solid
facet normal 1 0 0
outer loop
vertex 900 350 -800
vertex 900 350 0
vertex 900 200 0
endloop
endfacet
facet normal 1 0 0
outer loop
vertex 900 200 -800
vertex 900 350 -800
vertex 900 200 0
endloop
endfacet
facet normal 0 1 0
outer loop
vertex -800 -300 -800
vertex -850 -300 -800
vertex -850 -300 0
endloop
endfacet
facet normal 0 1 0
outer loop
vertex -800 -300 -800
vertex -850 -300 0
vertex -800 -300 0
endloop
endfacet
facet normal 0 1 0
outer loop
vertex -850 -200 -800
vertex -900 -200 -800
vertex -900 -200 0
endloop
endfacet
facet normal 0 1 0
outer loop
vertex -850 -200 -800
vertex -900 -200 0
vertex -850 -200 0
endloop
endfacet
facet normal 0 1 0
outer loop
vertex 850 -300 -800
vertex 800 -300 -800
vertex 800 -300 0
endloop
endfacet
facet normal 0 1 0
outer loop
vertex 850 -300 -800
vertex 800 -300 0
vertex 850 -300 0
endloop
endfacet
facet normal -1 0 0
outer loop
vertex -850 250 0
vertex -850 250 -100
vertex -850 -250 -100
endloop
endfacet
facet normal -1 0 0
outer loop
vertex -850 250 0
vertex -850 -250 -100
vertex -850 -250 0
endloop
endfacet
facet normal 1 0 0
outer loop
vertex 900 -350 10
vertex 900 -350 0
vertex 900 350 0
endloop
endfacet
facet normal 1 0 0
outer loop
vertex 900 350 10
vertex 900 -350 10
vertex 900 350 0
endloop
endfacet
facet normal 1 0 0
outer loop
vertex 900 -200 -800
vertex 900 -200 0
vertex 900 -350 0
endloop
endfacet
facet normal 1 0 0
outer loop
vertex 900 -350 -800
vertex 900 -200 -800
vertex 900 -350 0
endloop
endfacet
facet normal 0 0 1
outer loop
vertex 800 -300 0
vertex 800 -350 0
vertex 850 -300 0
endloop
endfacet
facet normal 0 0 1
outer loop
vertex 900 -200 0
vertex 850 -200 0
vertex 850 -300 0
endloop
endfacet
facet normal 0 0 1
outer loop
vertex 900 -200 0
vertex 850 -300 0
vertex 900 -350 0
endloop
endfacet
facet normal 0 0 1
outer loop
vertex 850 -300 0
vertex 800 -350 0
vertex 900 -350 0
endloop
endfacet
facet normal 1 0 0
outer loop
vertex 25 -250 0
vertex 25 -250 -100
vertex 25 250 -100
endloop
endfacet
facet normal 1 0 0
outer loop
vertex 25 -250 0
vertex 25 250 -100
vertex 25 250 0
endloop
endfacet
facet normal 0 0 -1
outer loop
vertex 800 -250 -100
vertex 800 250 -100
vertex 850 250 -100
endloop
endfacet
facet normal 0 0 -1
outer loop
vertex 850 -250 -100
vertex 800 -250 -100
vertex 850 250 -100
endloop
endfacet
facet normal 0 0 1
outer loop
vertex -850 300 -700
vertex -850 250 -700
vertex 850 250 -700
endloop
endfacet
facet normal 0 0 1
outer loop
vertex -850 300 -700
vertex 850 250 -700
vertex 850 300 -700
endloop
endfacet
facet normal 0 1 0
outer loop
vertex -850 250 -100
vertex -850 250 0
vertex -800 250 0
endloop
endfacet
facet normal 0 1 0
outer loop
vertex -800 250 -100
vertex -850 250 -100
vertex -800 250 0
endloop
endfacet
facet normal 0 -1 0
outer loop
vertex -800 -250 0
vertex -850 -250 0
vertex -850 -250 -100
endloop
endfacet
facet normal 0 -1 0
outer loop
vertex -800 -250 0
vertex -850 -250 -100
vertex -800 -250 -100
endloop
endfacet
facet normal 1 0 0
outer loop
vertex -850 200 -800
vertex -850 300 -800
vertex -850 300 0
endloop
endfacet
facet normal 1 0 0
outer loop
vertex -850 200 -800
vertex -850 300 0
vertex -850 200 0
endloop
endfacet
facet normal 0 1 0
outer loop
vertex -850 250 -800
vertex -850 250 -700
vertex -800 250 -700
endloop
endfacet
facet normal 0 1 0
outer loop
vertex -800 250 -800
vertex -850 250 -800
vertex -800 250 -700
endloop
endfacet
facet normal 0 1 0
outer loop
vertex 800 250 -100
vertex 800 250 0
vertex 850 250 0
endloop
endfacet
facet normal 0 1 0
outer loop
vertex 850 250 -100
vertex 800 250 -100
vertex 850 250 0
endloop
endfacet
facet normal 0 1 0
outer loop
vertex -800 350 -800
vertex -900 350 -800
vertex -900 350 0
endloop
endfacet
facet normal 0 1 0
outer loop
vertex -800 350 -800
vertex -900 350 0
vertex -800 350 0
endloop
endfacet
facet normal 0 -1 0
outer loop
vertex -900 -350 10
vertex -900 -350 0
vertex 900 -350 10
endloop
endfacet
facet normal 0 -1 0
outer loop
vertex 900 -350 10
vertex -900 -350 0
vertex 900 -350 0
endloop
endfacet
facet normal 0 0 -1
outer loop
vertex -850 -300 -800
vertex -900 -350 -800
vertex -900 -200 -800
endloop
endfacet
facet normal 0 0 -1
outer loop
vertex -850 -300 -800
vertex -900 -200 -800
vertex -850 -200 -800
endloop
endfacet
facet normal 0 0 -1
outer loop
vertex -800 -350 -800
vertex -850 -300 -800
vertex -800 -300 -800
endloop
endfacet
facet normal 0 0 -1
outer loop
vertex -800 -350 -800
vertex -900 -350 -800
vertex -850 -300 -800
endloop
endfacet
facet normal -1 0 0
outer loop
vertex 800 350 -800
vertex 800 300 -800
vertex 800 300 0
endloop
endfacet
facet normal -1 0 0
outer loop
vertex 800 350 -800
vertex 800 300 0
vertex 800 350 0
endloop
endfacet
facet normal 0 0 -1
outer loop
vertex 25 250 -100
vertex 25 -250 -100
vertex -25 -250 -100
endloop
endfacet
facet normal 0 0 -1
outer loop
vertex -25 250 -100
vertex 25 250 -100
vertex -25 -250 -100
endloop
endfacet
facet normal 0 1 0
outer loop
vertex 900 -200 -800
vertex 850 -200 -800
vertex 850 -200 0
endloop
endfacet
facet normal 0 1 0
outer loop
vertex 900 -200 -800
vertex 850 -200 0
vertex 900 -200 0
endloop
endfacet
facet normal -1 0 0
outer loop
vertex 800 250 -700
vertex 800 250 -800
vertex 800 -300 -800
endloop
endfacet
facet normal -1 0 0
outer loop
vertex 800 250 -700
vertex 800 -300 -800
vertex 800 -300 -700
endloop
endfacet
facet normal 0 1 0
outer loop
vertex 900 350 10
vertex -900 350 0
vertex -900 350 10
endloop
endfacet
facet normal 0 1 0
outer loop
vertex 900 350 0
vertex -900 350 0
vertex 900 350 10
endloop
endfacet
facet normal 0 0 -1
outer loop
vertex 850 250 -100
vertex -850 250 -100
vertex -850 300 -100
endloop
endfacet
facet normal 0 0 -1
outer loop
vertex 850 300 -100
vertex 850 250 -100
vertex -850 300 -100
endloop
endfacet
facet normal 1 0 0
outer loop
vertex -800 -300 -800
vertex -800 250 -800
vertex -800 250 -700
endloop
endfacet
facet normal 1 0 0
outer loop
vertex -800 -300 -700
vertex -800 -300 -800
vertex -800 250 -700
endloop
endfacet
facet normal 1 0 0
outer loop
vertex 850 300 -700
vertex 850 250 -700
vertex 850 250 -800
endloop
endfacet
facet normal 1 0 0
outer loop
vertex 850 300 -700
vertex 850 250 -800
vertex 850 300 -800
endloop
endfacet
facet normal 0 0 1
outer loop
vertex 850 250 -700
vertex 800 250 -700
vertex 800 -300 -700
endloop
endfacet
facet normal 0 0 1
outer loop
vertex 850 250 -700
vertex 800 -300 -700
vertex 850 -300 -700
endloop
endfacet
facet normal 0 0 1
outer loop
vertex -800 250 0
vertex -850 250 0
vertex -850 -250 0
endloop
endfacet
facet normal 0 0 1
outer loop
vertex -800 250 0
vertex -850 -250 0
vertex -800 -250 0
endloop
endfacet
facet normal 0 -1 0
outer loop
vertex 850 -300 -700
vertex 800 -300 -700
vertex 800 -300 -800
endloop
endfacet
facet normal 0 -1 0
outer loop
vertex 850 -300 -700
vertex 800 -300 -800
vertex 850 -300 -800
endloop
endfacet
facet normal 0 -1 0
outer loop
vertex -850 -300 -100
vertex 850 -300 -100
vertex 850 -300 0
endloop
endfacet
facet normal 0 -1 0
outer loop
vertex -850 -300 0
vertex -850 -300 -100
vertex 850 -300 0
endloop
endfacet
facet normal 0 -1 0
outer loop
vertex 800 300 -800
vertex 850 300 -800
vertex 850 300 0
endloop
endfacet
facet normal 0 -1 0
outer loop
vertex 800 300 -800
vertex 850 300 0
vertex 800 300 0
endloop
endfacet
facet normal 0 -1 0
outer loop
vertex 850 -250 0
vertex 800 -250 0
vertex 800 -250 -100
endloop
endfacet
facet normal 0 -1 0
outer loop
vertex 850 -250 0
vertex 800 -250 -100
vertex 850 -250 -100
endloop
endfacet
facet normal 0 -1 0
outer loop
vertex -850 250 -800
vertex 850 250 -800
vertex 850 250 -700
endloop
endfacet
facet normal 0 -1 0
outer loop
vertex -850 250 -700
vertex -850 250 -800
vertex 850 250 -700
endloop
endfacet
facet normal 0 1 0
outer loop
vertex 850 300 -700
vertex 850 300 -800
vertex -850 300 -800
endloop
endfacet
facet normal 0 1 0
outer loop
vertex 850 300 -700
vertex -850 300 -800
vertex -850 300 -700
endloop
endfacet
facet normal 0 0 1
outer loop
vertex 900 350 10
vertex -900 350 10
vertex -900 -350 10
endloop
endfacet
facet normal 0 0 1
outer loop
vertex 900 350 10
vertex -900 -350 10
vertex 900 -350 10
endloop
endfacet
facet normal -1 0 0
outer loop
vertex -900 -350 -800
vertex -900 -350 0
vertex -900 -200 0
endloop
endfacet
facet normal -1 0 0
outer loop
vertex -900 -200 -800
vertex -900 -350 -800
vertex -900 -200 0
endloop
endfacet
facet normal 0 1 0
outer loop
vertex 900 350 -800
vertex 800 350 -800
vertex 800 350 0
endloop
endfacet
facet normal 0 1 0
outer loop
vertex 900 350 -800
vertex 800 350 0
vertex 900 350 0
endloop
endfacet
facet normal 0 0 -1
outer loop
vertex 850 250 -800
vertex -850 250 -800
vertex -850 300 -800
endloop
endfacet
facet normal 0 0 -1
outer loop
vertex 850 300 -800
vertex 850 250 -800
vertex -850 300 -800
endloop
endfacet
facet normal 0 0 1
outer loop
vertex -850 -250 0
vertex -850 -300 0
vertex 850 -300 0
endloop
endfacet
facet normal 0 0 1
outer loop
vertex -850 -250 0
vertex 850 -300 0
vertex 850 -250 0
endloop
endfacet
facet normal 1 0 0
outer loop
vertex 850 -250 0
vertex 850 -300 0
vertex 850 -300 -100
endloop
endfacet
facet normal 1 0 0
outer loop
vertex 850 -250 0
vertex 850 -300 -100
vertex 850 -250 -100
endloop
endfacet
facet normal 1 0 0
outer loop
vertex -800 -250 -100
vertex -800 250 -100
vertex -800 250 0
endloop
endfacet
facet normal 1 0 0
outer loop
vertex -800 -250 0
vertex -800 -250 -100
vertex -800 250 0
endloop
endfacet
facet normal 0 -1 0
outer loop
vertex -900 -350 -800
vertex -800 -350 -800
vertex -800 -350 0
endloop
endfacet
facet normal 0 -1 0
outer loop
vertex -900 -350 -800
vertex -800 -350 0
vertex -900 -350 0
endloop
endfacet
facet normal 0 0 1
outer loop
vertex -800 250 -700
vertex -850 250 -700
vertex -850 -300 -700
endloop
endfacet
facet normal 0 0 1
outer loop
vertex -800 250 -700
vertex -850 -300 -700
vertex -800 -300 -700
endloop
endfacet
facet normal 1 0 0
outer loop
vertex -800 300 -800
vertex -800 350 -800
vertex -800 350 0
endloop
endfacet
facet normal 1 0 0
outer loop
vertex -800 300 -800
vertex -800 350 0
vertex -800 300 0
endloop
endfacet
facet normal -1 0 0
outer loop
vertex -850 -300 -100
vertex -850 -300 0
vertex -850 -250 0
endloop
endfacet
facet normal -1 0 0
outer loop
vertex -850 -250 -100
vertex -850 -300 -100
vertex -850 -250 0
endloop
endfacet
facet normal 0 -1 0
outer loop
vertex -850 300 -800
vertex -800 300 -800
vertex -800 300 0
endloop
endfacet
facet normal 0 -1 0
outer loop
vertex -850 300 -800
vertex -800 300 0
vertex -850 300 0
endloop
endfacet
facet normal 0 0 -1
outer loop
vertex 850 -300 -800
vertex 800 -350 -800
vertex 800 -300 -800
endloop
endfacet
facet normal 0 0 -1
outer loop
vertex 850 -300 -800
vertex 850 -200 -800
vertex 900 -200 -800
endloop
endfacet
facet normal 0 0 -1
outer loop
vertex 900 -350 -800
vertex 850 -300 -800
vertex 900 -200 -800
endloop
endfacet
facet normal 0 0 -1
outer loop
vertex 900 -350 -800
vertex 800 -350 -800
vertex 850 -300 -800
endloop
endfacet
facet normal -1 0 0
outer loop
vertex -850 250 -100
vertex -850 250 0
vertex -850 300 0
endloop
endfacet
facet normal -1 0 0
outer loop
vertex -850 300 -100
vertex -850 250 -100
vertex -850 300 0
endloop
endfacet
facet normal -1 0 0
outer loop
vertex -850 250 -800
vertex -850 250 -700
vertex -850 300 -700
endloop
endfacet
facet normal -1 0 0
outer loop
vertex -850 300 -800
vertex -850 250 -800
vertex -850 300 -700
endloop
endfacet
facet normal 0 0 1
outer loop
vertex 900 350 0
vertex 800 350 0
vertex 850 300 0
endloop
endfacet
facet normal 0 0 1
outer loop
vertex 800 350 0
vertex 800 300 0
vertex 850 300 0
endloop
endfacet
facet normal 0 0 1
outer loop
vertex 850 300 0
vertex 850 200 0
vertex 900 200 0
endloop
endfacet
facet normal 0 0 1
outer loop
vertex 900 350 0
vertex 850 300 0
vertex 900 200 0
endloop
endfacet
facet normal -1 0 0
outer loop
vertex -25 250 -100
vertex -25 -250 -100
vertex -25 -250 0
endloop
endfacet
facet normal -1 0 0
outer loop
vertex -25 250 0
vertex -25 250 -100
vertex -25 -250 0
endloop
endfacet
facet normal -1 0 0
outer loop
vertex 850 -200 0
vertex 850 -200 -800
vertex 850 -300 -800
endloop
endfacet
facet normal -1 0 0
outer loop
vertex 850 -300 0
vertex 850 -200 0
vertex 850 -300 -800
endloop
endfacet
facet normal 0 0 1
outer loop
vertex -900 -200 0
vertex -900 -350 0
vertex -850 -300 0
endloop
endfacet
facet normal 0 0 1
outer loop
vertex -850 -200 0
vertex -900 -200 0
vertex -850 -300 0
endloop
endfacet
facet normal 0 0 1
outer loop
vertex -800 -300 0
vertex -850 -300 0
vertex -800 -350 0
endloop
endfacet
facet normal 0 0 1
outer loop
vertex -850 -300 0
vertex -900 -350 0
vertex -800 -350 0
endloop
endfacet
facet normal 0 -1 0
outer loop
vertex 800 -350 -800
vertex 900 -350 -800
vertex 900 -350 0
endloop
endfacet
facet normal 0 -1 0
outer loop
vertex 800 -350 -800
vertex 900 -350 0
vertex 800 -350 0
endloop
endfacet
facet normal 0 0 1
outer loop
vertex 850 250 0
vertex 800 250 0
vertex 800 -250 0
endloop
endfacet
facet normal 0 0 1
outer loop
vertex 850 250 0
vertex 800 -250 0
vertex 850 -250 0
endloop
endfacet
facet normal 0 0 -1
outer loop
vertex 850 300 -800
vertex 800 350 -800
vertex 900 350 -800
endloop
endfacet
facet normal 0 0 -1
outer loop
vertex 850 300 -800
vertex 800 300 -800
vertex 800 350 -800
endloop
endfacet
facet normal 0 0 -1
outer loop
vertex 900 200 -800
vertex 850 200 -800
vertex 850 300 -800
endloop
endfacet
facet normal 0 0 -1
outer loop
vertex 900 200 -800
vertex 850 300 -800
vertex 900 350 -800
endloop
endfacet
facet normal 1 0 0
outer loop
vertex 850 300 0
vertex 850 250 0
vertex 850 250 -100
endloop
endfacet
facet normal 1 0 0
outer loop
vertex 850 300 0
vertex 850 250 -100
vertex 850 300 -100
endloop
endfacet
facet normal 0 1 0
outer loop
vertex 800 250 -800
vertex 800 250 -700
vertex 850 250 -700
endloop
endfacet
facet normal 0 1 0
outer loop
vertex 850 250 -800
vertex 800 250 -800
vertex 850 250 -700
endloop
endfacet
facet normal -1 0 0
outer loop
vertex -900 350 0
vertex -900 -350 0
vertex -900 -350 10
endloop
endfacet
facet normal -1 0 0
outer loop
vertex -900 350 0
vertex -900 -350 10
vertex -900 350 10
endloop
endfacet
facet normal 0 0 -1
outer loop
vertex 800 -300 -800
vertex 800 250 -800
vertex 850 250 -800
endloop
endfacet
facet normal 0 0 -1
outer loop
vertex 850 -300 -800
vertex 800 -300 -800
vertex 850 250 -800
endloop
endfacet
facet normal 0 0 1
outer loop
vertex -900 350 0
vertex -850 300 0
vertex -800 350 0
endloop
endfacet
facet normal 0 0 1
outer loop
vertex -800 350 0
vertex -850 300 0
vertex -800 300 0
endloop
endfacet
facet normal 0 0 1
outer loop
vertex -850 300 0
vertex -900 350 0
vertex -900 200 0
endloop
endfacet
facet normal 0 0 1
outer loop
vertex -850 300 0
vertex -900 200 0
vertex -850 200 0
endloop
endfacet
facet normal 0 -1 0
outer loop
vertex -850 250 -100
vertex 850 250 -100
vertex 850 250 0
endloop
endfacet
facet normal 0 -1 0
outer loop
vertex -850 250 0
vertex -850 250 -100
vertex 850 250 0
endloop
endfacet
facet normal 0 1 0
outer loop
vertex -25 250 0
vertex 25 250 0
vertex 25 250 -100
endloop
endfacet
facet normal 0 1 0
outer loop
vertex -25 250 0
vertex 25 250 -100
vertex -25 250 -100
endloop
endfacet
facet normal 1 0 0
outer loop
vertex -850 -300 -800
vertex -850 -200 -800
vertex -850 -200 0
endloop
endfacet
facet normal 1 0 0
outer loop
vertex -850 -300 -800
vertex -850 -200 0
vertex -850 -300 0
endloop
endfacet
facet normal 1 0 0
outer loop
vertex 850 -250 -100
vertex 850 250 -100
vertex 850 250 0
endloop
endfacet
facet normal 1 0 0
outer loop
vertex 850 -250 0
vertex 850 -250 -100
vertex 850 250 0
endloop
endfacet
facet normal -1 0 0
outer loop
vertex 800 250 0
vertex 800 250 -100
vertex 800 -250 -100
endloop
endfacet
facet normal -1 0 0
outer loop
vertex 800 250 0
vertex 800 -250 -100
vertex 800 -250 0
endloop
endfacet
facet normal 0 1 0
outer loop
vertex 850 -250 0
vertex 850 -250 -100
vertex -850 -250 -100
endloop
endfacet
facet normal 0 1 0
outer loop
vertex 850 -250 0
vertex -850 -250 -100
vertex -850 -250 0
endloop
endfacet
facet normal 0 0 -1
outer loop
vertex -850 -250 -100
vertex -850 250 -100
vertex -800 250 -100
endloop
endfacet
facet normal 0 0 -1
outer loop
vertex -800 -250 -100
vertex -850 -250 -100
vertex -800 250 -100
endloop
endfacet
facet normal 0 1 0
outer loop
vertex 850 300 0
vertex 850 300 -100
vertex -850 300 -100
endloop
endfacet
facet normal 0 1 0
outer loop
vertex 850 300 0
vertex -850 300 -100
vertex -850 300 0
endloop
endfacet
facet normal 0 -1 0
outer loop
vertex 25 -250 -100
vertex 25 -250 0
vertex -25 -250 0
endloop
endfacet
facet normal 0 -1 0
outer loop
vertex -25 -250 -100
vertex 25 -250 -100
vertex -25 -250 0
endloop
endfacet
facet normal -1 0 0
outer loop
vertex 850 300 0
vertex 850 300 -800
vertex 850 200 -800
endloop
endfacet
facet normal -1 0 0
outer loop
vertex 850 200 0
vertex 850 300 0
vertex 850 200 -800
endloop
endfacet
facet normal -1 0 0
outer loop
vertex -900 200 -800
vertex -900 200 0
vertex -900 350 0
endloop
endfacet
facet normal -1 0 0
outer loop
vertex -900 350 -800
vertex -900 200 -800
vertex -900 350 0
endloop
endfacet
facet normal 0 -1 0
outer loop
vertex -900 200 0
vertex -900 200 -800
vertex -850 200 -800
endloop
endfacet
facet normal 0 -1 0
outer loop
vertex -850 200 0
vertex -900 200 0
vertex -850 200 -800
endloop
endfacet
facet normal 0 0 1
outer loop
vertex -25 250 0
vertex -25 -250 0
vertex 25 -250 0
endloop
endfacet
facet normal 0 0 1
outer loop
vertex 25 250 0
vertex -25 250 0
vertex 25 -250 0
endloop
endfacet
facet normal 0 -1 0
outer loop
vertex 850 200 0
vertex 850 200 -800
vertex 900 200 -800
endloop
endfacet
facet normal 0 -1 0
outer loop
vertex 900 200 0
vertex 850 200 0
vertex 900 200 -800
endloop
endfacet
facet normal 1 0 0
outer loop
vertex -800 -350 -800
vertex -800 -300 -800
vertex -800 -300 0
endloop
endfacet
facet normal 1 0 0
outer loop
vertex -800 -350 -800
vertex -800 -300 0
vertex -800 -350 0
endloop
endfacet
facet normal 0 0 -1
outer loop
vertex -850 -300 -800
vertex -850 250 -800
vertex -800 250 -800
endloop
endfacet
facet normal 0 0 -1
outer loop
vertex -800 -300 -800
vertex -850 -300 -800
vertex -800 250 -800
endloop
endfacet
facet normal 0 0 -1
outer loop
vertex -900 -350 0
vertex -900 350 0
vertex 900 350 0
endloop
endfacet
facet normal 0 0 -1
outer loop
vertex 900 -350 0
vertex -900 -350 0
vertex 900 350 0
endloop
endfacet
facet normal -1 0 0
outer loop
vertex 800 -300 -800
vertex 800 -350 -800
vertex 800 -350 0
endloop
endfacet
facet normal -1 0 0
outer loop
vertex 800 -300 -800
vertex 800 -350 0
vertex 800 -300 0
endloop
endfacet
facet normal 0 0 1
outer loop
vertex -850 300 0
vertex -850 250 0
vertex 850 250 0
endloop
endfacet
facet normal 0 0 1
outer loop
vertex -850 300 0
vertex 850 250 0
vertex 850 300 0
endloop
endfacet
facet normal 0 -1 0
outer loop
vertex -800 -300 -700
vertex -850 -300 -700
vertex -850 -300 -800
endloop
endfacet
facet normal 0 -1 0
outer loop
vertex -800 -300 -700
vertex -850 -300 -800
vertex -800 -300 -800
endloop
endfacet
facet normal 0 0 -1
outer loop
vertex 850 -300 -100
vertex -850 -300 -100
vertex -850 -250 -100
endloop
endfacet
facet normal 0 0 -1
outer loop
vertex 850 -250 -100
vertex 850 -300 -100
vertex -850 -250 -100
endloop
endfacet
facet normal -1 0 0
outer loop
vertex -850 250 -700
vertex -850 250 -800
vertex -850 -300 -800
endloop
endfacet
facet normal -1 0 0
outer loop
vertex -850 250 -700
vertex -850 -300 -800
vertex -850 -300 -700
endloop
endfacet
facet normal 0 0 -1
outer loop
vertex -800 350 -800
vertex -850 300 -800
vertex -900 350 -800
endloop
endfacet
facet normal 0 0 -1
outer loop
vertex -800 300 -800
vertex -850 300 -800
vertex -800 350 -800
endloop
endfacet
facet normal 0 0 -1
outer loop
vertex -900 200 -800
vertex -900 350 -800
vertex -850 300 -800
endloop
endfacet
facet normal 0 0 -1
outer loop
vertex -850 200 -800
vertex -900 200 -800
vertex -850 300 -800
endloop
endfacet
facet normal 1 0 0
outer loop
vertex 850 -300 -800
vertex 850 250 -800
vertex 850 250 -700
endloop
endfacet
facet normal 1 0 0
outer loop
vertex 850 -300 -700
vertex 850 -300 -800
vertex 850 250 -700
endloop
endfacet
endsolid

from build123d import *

# Parameters (mm, degrees)
F0_W      = 1800
F0_H      = 700
F1_DEPTH  = 10
F2_W      = 50
F2_H      = 100
F3_DEPTH  = 800
F4_W      = 50
F4_H      = 100
F5_DEPTH  = 1700
F6_W      = 50
F6_H      = 100
F7_DEPTH  = 1700
F8_W      = 50
F8_H      = 100
F9_DEPTH  = 500
F10_W     = 50
F10_H     = 100
F11_DEPTH = 500
F12_W     = 50
F12_H     = 100
F13_DEPTH = 1700
F14_W     = 50
F14_H     = 100
F15_DEPTH = 550
F16_W     = 50
F16_H     = 100
F17_DEPTH = 550
F18_W     = 25
F18_H     = 100
F19_DEPTH = 500


with BuildPart() as f1:
    # F0 (on Top) → F1 (new body)
    with BuildSketch(Plane.XY):
        Rectangle(F0_W, F0_H)
    extrude(amount=F1_DEPTH)


with BuildPart() as f3:
    # F2 (on face) → F3 (new body)
    with BuildSketch(Plane(origin=(0, 0, 0), x_dir=(1, 0, 0), z_dir=(0, 0, -1))):
        Polygon((-800, 350), (-900, 350), (-900, 300), (-850, 300), (-800, 300), align=None)
        with Locations((-875, 250)):
            Rectangle(F2_W, F2_H)
        with Locations((-875, -250)):
            Rectangle(F2_W, F2_H)
        Polygon((-850, -300), (-900, -300), (-900, -350), (-800, -350), (-800, -300), align=None)
        Polygon((800, -350), (900, -350), (900, -300), (850, -300), (800, -300), align=None)
        with Locations((875, -250)):
            Rectangle(F2_W, F2_H)
        Polygon((900, 300), (900, 350), (800, 350), (800, 300), (850, 300), align=None)
        with Locations((875, 250)):
            Rectangle(F2_W, F2_H)
    extrude(amount=F3_DEPTH)


with BuildPart() as f5:
    # F4 (on face) → F5 (new body, through all)
    with BuildSketch(Plane.YZ.offset(-850)):
        with Locations((-275, -50)):
            Rectangle(F4_W, F4_H)
    extrude(amount=F5_DEPTH)


with BuildPart() as f7:
    # F6 (on face) → F7 (new body, through all)
    with BuildSketch(Plane.YZ.offset(-850)):
        with Locations((275, -50)):
            Rectangle(F6_W, F6_H)
    extrude(amount=F7_DEPTH)


with BuildPart() as f9:
    # F8 (on face) → F9 (new body, through all)
    with BuildSketch(Plane.XZ.offset(-250)):
        with Locations((-825, -50)):
            Rectangle(F8_W, F8_H)
    extrude(amount=F9_DEPTH)


with BuildPart() as f11:
    # F10 (on face) → F11 (new body, through all)
    with BuildSketch(Plane.XZ.offset(-250)):
        with Locations((825, -50)):
            Rectangle(F10_W, F10_H)
    extrude(amount=F11_DEPTH)


with BuildPart() as f13:
    # F12 (on face) → F13 (new body, through all)
    with BuildSketch(Plane.YZ.offset(-850)):
        with Locations((275, -750)):
            Rectangle(F12_W, F12_H)
    extrude(amount=F13_DEPTH)


with BuildPart() as f15:
    # F14 (on face) → F15 (new body, through all)
    with BuildSketch(Plane.XZ.offset(-250)):
        with Locations((825, -750)):
            Rectangle(F14_W, F14_H)
    extrude(amount=F15_DEPTH)


with BuildPart() as f17:
    # F16 (on face) → F17 (new body, through all)
    with BuildSketch(Plane.XZ.offset(-250)):
        with Locations((-825, -750)):
            Rectangle(F16_W, F16_H)
    extrude(amount=F17_DEPTH)


with BuildPart() as f19:
    # F18 (on face) → F19 (new body, through all)
    with BuildSketch(Plane(origin=(0, -250, 0), x_dir=(-1, 0, 0), z_dir=(0, 1, 0))):
        with Locations((-12.5, -50)):
            Rectangle(F18_W, F18_H)
        with Locations((12.5, -50)):
            Rectangle(F18_W, F18_H)
    extrude(amount=F19_DEPTH)


solid = Compound([f1.part, f3.part, f5.part, f7.part, f9.part, f11.part, f13.part, f15.part, f17.part, f19.part])
